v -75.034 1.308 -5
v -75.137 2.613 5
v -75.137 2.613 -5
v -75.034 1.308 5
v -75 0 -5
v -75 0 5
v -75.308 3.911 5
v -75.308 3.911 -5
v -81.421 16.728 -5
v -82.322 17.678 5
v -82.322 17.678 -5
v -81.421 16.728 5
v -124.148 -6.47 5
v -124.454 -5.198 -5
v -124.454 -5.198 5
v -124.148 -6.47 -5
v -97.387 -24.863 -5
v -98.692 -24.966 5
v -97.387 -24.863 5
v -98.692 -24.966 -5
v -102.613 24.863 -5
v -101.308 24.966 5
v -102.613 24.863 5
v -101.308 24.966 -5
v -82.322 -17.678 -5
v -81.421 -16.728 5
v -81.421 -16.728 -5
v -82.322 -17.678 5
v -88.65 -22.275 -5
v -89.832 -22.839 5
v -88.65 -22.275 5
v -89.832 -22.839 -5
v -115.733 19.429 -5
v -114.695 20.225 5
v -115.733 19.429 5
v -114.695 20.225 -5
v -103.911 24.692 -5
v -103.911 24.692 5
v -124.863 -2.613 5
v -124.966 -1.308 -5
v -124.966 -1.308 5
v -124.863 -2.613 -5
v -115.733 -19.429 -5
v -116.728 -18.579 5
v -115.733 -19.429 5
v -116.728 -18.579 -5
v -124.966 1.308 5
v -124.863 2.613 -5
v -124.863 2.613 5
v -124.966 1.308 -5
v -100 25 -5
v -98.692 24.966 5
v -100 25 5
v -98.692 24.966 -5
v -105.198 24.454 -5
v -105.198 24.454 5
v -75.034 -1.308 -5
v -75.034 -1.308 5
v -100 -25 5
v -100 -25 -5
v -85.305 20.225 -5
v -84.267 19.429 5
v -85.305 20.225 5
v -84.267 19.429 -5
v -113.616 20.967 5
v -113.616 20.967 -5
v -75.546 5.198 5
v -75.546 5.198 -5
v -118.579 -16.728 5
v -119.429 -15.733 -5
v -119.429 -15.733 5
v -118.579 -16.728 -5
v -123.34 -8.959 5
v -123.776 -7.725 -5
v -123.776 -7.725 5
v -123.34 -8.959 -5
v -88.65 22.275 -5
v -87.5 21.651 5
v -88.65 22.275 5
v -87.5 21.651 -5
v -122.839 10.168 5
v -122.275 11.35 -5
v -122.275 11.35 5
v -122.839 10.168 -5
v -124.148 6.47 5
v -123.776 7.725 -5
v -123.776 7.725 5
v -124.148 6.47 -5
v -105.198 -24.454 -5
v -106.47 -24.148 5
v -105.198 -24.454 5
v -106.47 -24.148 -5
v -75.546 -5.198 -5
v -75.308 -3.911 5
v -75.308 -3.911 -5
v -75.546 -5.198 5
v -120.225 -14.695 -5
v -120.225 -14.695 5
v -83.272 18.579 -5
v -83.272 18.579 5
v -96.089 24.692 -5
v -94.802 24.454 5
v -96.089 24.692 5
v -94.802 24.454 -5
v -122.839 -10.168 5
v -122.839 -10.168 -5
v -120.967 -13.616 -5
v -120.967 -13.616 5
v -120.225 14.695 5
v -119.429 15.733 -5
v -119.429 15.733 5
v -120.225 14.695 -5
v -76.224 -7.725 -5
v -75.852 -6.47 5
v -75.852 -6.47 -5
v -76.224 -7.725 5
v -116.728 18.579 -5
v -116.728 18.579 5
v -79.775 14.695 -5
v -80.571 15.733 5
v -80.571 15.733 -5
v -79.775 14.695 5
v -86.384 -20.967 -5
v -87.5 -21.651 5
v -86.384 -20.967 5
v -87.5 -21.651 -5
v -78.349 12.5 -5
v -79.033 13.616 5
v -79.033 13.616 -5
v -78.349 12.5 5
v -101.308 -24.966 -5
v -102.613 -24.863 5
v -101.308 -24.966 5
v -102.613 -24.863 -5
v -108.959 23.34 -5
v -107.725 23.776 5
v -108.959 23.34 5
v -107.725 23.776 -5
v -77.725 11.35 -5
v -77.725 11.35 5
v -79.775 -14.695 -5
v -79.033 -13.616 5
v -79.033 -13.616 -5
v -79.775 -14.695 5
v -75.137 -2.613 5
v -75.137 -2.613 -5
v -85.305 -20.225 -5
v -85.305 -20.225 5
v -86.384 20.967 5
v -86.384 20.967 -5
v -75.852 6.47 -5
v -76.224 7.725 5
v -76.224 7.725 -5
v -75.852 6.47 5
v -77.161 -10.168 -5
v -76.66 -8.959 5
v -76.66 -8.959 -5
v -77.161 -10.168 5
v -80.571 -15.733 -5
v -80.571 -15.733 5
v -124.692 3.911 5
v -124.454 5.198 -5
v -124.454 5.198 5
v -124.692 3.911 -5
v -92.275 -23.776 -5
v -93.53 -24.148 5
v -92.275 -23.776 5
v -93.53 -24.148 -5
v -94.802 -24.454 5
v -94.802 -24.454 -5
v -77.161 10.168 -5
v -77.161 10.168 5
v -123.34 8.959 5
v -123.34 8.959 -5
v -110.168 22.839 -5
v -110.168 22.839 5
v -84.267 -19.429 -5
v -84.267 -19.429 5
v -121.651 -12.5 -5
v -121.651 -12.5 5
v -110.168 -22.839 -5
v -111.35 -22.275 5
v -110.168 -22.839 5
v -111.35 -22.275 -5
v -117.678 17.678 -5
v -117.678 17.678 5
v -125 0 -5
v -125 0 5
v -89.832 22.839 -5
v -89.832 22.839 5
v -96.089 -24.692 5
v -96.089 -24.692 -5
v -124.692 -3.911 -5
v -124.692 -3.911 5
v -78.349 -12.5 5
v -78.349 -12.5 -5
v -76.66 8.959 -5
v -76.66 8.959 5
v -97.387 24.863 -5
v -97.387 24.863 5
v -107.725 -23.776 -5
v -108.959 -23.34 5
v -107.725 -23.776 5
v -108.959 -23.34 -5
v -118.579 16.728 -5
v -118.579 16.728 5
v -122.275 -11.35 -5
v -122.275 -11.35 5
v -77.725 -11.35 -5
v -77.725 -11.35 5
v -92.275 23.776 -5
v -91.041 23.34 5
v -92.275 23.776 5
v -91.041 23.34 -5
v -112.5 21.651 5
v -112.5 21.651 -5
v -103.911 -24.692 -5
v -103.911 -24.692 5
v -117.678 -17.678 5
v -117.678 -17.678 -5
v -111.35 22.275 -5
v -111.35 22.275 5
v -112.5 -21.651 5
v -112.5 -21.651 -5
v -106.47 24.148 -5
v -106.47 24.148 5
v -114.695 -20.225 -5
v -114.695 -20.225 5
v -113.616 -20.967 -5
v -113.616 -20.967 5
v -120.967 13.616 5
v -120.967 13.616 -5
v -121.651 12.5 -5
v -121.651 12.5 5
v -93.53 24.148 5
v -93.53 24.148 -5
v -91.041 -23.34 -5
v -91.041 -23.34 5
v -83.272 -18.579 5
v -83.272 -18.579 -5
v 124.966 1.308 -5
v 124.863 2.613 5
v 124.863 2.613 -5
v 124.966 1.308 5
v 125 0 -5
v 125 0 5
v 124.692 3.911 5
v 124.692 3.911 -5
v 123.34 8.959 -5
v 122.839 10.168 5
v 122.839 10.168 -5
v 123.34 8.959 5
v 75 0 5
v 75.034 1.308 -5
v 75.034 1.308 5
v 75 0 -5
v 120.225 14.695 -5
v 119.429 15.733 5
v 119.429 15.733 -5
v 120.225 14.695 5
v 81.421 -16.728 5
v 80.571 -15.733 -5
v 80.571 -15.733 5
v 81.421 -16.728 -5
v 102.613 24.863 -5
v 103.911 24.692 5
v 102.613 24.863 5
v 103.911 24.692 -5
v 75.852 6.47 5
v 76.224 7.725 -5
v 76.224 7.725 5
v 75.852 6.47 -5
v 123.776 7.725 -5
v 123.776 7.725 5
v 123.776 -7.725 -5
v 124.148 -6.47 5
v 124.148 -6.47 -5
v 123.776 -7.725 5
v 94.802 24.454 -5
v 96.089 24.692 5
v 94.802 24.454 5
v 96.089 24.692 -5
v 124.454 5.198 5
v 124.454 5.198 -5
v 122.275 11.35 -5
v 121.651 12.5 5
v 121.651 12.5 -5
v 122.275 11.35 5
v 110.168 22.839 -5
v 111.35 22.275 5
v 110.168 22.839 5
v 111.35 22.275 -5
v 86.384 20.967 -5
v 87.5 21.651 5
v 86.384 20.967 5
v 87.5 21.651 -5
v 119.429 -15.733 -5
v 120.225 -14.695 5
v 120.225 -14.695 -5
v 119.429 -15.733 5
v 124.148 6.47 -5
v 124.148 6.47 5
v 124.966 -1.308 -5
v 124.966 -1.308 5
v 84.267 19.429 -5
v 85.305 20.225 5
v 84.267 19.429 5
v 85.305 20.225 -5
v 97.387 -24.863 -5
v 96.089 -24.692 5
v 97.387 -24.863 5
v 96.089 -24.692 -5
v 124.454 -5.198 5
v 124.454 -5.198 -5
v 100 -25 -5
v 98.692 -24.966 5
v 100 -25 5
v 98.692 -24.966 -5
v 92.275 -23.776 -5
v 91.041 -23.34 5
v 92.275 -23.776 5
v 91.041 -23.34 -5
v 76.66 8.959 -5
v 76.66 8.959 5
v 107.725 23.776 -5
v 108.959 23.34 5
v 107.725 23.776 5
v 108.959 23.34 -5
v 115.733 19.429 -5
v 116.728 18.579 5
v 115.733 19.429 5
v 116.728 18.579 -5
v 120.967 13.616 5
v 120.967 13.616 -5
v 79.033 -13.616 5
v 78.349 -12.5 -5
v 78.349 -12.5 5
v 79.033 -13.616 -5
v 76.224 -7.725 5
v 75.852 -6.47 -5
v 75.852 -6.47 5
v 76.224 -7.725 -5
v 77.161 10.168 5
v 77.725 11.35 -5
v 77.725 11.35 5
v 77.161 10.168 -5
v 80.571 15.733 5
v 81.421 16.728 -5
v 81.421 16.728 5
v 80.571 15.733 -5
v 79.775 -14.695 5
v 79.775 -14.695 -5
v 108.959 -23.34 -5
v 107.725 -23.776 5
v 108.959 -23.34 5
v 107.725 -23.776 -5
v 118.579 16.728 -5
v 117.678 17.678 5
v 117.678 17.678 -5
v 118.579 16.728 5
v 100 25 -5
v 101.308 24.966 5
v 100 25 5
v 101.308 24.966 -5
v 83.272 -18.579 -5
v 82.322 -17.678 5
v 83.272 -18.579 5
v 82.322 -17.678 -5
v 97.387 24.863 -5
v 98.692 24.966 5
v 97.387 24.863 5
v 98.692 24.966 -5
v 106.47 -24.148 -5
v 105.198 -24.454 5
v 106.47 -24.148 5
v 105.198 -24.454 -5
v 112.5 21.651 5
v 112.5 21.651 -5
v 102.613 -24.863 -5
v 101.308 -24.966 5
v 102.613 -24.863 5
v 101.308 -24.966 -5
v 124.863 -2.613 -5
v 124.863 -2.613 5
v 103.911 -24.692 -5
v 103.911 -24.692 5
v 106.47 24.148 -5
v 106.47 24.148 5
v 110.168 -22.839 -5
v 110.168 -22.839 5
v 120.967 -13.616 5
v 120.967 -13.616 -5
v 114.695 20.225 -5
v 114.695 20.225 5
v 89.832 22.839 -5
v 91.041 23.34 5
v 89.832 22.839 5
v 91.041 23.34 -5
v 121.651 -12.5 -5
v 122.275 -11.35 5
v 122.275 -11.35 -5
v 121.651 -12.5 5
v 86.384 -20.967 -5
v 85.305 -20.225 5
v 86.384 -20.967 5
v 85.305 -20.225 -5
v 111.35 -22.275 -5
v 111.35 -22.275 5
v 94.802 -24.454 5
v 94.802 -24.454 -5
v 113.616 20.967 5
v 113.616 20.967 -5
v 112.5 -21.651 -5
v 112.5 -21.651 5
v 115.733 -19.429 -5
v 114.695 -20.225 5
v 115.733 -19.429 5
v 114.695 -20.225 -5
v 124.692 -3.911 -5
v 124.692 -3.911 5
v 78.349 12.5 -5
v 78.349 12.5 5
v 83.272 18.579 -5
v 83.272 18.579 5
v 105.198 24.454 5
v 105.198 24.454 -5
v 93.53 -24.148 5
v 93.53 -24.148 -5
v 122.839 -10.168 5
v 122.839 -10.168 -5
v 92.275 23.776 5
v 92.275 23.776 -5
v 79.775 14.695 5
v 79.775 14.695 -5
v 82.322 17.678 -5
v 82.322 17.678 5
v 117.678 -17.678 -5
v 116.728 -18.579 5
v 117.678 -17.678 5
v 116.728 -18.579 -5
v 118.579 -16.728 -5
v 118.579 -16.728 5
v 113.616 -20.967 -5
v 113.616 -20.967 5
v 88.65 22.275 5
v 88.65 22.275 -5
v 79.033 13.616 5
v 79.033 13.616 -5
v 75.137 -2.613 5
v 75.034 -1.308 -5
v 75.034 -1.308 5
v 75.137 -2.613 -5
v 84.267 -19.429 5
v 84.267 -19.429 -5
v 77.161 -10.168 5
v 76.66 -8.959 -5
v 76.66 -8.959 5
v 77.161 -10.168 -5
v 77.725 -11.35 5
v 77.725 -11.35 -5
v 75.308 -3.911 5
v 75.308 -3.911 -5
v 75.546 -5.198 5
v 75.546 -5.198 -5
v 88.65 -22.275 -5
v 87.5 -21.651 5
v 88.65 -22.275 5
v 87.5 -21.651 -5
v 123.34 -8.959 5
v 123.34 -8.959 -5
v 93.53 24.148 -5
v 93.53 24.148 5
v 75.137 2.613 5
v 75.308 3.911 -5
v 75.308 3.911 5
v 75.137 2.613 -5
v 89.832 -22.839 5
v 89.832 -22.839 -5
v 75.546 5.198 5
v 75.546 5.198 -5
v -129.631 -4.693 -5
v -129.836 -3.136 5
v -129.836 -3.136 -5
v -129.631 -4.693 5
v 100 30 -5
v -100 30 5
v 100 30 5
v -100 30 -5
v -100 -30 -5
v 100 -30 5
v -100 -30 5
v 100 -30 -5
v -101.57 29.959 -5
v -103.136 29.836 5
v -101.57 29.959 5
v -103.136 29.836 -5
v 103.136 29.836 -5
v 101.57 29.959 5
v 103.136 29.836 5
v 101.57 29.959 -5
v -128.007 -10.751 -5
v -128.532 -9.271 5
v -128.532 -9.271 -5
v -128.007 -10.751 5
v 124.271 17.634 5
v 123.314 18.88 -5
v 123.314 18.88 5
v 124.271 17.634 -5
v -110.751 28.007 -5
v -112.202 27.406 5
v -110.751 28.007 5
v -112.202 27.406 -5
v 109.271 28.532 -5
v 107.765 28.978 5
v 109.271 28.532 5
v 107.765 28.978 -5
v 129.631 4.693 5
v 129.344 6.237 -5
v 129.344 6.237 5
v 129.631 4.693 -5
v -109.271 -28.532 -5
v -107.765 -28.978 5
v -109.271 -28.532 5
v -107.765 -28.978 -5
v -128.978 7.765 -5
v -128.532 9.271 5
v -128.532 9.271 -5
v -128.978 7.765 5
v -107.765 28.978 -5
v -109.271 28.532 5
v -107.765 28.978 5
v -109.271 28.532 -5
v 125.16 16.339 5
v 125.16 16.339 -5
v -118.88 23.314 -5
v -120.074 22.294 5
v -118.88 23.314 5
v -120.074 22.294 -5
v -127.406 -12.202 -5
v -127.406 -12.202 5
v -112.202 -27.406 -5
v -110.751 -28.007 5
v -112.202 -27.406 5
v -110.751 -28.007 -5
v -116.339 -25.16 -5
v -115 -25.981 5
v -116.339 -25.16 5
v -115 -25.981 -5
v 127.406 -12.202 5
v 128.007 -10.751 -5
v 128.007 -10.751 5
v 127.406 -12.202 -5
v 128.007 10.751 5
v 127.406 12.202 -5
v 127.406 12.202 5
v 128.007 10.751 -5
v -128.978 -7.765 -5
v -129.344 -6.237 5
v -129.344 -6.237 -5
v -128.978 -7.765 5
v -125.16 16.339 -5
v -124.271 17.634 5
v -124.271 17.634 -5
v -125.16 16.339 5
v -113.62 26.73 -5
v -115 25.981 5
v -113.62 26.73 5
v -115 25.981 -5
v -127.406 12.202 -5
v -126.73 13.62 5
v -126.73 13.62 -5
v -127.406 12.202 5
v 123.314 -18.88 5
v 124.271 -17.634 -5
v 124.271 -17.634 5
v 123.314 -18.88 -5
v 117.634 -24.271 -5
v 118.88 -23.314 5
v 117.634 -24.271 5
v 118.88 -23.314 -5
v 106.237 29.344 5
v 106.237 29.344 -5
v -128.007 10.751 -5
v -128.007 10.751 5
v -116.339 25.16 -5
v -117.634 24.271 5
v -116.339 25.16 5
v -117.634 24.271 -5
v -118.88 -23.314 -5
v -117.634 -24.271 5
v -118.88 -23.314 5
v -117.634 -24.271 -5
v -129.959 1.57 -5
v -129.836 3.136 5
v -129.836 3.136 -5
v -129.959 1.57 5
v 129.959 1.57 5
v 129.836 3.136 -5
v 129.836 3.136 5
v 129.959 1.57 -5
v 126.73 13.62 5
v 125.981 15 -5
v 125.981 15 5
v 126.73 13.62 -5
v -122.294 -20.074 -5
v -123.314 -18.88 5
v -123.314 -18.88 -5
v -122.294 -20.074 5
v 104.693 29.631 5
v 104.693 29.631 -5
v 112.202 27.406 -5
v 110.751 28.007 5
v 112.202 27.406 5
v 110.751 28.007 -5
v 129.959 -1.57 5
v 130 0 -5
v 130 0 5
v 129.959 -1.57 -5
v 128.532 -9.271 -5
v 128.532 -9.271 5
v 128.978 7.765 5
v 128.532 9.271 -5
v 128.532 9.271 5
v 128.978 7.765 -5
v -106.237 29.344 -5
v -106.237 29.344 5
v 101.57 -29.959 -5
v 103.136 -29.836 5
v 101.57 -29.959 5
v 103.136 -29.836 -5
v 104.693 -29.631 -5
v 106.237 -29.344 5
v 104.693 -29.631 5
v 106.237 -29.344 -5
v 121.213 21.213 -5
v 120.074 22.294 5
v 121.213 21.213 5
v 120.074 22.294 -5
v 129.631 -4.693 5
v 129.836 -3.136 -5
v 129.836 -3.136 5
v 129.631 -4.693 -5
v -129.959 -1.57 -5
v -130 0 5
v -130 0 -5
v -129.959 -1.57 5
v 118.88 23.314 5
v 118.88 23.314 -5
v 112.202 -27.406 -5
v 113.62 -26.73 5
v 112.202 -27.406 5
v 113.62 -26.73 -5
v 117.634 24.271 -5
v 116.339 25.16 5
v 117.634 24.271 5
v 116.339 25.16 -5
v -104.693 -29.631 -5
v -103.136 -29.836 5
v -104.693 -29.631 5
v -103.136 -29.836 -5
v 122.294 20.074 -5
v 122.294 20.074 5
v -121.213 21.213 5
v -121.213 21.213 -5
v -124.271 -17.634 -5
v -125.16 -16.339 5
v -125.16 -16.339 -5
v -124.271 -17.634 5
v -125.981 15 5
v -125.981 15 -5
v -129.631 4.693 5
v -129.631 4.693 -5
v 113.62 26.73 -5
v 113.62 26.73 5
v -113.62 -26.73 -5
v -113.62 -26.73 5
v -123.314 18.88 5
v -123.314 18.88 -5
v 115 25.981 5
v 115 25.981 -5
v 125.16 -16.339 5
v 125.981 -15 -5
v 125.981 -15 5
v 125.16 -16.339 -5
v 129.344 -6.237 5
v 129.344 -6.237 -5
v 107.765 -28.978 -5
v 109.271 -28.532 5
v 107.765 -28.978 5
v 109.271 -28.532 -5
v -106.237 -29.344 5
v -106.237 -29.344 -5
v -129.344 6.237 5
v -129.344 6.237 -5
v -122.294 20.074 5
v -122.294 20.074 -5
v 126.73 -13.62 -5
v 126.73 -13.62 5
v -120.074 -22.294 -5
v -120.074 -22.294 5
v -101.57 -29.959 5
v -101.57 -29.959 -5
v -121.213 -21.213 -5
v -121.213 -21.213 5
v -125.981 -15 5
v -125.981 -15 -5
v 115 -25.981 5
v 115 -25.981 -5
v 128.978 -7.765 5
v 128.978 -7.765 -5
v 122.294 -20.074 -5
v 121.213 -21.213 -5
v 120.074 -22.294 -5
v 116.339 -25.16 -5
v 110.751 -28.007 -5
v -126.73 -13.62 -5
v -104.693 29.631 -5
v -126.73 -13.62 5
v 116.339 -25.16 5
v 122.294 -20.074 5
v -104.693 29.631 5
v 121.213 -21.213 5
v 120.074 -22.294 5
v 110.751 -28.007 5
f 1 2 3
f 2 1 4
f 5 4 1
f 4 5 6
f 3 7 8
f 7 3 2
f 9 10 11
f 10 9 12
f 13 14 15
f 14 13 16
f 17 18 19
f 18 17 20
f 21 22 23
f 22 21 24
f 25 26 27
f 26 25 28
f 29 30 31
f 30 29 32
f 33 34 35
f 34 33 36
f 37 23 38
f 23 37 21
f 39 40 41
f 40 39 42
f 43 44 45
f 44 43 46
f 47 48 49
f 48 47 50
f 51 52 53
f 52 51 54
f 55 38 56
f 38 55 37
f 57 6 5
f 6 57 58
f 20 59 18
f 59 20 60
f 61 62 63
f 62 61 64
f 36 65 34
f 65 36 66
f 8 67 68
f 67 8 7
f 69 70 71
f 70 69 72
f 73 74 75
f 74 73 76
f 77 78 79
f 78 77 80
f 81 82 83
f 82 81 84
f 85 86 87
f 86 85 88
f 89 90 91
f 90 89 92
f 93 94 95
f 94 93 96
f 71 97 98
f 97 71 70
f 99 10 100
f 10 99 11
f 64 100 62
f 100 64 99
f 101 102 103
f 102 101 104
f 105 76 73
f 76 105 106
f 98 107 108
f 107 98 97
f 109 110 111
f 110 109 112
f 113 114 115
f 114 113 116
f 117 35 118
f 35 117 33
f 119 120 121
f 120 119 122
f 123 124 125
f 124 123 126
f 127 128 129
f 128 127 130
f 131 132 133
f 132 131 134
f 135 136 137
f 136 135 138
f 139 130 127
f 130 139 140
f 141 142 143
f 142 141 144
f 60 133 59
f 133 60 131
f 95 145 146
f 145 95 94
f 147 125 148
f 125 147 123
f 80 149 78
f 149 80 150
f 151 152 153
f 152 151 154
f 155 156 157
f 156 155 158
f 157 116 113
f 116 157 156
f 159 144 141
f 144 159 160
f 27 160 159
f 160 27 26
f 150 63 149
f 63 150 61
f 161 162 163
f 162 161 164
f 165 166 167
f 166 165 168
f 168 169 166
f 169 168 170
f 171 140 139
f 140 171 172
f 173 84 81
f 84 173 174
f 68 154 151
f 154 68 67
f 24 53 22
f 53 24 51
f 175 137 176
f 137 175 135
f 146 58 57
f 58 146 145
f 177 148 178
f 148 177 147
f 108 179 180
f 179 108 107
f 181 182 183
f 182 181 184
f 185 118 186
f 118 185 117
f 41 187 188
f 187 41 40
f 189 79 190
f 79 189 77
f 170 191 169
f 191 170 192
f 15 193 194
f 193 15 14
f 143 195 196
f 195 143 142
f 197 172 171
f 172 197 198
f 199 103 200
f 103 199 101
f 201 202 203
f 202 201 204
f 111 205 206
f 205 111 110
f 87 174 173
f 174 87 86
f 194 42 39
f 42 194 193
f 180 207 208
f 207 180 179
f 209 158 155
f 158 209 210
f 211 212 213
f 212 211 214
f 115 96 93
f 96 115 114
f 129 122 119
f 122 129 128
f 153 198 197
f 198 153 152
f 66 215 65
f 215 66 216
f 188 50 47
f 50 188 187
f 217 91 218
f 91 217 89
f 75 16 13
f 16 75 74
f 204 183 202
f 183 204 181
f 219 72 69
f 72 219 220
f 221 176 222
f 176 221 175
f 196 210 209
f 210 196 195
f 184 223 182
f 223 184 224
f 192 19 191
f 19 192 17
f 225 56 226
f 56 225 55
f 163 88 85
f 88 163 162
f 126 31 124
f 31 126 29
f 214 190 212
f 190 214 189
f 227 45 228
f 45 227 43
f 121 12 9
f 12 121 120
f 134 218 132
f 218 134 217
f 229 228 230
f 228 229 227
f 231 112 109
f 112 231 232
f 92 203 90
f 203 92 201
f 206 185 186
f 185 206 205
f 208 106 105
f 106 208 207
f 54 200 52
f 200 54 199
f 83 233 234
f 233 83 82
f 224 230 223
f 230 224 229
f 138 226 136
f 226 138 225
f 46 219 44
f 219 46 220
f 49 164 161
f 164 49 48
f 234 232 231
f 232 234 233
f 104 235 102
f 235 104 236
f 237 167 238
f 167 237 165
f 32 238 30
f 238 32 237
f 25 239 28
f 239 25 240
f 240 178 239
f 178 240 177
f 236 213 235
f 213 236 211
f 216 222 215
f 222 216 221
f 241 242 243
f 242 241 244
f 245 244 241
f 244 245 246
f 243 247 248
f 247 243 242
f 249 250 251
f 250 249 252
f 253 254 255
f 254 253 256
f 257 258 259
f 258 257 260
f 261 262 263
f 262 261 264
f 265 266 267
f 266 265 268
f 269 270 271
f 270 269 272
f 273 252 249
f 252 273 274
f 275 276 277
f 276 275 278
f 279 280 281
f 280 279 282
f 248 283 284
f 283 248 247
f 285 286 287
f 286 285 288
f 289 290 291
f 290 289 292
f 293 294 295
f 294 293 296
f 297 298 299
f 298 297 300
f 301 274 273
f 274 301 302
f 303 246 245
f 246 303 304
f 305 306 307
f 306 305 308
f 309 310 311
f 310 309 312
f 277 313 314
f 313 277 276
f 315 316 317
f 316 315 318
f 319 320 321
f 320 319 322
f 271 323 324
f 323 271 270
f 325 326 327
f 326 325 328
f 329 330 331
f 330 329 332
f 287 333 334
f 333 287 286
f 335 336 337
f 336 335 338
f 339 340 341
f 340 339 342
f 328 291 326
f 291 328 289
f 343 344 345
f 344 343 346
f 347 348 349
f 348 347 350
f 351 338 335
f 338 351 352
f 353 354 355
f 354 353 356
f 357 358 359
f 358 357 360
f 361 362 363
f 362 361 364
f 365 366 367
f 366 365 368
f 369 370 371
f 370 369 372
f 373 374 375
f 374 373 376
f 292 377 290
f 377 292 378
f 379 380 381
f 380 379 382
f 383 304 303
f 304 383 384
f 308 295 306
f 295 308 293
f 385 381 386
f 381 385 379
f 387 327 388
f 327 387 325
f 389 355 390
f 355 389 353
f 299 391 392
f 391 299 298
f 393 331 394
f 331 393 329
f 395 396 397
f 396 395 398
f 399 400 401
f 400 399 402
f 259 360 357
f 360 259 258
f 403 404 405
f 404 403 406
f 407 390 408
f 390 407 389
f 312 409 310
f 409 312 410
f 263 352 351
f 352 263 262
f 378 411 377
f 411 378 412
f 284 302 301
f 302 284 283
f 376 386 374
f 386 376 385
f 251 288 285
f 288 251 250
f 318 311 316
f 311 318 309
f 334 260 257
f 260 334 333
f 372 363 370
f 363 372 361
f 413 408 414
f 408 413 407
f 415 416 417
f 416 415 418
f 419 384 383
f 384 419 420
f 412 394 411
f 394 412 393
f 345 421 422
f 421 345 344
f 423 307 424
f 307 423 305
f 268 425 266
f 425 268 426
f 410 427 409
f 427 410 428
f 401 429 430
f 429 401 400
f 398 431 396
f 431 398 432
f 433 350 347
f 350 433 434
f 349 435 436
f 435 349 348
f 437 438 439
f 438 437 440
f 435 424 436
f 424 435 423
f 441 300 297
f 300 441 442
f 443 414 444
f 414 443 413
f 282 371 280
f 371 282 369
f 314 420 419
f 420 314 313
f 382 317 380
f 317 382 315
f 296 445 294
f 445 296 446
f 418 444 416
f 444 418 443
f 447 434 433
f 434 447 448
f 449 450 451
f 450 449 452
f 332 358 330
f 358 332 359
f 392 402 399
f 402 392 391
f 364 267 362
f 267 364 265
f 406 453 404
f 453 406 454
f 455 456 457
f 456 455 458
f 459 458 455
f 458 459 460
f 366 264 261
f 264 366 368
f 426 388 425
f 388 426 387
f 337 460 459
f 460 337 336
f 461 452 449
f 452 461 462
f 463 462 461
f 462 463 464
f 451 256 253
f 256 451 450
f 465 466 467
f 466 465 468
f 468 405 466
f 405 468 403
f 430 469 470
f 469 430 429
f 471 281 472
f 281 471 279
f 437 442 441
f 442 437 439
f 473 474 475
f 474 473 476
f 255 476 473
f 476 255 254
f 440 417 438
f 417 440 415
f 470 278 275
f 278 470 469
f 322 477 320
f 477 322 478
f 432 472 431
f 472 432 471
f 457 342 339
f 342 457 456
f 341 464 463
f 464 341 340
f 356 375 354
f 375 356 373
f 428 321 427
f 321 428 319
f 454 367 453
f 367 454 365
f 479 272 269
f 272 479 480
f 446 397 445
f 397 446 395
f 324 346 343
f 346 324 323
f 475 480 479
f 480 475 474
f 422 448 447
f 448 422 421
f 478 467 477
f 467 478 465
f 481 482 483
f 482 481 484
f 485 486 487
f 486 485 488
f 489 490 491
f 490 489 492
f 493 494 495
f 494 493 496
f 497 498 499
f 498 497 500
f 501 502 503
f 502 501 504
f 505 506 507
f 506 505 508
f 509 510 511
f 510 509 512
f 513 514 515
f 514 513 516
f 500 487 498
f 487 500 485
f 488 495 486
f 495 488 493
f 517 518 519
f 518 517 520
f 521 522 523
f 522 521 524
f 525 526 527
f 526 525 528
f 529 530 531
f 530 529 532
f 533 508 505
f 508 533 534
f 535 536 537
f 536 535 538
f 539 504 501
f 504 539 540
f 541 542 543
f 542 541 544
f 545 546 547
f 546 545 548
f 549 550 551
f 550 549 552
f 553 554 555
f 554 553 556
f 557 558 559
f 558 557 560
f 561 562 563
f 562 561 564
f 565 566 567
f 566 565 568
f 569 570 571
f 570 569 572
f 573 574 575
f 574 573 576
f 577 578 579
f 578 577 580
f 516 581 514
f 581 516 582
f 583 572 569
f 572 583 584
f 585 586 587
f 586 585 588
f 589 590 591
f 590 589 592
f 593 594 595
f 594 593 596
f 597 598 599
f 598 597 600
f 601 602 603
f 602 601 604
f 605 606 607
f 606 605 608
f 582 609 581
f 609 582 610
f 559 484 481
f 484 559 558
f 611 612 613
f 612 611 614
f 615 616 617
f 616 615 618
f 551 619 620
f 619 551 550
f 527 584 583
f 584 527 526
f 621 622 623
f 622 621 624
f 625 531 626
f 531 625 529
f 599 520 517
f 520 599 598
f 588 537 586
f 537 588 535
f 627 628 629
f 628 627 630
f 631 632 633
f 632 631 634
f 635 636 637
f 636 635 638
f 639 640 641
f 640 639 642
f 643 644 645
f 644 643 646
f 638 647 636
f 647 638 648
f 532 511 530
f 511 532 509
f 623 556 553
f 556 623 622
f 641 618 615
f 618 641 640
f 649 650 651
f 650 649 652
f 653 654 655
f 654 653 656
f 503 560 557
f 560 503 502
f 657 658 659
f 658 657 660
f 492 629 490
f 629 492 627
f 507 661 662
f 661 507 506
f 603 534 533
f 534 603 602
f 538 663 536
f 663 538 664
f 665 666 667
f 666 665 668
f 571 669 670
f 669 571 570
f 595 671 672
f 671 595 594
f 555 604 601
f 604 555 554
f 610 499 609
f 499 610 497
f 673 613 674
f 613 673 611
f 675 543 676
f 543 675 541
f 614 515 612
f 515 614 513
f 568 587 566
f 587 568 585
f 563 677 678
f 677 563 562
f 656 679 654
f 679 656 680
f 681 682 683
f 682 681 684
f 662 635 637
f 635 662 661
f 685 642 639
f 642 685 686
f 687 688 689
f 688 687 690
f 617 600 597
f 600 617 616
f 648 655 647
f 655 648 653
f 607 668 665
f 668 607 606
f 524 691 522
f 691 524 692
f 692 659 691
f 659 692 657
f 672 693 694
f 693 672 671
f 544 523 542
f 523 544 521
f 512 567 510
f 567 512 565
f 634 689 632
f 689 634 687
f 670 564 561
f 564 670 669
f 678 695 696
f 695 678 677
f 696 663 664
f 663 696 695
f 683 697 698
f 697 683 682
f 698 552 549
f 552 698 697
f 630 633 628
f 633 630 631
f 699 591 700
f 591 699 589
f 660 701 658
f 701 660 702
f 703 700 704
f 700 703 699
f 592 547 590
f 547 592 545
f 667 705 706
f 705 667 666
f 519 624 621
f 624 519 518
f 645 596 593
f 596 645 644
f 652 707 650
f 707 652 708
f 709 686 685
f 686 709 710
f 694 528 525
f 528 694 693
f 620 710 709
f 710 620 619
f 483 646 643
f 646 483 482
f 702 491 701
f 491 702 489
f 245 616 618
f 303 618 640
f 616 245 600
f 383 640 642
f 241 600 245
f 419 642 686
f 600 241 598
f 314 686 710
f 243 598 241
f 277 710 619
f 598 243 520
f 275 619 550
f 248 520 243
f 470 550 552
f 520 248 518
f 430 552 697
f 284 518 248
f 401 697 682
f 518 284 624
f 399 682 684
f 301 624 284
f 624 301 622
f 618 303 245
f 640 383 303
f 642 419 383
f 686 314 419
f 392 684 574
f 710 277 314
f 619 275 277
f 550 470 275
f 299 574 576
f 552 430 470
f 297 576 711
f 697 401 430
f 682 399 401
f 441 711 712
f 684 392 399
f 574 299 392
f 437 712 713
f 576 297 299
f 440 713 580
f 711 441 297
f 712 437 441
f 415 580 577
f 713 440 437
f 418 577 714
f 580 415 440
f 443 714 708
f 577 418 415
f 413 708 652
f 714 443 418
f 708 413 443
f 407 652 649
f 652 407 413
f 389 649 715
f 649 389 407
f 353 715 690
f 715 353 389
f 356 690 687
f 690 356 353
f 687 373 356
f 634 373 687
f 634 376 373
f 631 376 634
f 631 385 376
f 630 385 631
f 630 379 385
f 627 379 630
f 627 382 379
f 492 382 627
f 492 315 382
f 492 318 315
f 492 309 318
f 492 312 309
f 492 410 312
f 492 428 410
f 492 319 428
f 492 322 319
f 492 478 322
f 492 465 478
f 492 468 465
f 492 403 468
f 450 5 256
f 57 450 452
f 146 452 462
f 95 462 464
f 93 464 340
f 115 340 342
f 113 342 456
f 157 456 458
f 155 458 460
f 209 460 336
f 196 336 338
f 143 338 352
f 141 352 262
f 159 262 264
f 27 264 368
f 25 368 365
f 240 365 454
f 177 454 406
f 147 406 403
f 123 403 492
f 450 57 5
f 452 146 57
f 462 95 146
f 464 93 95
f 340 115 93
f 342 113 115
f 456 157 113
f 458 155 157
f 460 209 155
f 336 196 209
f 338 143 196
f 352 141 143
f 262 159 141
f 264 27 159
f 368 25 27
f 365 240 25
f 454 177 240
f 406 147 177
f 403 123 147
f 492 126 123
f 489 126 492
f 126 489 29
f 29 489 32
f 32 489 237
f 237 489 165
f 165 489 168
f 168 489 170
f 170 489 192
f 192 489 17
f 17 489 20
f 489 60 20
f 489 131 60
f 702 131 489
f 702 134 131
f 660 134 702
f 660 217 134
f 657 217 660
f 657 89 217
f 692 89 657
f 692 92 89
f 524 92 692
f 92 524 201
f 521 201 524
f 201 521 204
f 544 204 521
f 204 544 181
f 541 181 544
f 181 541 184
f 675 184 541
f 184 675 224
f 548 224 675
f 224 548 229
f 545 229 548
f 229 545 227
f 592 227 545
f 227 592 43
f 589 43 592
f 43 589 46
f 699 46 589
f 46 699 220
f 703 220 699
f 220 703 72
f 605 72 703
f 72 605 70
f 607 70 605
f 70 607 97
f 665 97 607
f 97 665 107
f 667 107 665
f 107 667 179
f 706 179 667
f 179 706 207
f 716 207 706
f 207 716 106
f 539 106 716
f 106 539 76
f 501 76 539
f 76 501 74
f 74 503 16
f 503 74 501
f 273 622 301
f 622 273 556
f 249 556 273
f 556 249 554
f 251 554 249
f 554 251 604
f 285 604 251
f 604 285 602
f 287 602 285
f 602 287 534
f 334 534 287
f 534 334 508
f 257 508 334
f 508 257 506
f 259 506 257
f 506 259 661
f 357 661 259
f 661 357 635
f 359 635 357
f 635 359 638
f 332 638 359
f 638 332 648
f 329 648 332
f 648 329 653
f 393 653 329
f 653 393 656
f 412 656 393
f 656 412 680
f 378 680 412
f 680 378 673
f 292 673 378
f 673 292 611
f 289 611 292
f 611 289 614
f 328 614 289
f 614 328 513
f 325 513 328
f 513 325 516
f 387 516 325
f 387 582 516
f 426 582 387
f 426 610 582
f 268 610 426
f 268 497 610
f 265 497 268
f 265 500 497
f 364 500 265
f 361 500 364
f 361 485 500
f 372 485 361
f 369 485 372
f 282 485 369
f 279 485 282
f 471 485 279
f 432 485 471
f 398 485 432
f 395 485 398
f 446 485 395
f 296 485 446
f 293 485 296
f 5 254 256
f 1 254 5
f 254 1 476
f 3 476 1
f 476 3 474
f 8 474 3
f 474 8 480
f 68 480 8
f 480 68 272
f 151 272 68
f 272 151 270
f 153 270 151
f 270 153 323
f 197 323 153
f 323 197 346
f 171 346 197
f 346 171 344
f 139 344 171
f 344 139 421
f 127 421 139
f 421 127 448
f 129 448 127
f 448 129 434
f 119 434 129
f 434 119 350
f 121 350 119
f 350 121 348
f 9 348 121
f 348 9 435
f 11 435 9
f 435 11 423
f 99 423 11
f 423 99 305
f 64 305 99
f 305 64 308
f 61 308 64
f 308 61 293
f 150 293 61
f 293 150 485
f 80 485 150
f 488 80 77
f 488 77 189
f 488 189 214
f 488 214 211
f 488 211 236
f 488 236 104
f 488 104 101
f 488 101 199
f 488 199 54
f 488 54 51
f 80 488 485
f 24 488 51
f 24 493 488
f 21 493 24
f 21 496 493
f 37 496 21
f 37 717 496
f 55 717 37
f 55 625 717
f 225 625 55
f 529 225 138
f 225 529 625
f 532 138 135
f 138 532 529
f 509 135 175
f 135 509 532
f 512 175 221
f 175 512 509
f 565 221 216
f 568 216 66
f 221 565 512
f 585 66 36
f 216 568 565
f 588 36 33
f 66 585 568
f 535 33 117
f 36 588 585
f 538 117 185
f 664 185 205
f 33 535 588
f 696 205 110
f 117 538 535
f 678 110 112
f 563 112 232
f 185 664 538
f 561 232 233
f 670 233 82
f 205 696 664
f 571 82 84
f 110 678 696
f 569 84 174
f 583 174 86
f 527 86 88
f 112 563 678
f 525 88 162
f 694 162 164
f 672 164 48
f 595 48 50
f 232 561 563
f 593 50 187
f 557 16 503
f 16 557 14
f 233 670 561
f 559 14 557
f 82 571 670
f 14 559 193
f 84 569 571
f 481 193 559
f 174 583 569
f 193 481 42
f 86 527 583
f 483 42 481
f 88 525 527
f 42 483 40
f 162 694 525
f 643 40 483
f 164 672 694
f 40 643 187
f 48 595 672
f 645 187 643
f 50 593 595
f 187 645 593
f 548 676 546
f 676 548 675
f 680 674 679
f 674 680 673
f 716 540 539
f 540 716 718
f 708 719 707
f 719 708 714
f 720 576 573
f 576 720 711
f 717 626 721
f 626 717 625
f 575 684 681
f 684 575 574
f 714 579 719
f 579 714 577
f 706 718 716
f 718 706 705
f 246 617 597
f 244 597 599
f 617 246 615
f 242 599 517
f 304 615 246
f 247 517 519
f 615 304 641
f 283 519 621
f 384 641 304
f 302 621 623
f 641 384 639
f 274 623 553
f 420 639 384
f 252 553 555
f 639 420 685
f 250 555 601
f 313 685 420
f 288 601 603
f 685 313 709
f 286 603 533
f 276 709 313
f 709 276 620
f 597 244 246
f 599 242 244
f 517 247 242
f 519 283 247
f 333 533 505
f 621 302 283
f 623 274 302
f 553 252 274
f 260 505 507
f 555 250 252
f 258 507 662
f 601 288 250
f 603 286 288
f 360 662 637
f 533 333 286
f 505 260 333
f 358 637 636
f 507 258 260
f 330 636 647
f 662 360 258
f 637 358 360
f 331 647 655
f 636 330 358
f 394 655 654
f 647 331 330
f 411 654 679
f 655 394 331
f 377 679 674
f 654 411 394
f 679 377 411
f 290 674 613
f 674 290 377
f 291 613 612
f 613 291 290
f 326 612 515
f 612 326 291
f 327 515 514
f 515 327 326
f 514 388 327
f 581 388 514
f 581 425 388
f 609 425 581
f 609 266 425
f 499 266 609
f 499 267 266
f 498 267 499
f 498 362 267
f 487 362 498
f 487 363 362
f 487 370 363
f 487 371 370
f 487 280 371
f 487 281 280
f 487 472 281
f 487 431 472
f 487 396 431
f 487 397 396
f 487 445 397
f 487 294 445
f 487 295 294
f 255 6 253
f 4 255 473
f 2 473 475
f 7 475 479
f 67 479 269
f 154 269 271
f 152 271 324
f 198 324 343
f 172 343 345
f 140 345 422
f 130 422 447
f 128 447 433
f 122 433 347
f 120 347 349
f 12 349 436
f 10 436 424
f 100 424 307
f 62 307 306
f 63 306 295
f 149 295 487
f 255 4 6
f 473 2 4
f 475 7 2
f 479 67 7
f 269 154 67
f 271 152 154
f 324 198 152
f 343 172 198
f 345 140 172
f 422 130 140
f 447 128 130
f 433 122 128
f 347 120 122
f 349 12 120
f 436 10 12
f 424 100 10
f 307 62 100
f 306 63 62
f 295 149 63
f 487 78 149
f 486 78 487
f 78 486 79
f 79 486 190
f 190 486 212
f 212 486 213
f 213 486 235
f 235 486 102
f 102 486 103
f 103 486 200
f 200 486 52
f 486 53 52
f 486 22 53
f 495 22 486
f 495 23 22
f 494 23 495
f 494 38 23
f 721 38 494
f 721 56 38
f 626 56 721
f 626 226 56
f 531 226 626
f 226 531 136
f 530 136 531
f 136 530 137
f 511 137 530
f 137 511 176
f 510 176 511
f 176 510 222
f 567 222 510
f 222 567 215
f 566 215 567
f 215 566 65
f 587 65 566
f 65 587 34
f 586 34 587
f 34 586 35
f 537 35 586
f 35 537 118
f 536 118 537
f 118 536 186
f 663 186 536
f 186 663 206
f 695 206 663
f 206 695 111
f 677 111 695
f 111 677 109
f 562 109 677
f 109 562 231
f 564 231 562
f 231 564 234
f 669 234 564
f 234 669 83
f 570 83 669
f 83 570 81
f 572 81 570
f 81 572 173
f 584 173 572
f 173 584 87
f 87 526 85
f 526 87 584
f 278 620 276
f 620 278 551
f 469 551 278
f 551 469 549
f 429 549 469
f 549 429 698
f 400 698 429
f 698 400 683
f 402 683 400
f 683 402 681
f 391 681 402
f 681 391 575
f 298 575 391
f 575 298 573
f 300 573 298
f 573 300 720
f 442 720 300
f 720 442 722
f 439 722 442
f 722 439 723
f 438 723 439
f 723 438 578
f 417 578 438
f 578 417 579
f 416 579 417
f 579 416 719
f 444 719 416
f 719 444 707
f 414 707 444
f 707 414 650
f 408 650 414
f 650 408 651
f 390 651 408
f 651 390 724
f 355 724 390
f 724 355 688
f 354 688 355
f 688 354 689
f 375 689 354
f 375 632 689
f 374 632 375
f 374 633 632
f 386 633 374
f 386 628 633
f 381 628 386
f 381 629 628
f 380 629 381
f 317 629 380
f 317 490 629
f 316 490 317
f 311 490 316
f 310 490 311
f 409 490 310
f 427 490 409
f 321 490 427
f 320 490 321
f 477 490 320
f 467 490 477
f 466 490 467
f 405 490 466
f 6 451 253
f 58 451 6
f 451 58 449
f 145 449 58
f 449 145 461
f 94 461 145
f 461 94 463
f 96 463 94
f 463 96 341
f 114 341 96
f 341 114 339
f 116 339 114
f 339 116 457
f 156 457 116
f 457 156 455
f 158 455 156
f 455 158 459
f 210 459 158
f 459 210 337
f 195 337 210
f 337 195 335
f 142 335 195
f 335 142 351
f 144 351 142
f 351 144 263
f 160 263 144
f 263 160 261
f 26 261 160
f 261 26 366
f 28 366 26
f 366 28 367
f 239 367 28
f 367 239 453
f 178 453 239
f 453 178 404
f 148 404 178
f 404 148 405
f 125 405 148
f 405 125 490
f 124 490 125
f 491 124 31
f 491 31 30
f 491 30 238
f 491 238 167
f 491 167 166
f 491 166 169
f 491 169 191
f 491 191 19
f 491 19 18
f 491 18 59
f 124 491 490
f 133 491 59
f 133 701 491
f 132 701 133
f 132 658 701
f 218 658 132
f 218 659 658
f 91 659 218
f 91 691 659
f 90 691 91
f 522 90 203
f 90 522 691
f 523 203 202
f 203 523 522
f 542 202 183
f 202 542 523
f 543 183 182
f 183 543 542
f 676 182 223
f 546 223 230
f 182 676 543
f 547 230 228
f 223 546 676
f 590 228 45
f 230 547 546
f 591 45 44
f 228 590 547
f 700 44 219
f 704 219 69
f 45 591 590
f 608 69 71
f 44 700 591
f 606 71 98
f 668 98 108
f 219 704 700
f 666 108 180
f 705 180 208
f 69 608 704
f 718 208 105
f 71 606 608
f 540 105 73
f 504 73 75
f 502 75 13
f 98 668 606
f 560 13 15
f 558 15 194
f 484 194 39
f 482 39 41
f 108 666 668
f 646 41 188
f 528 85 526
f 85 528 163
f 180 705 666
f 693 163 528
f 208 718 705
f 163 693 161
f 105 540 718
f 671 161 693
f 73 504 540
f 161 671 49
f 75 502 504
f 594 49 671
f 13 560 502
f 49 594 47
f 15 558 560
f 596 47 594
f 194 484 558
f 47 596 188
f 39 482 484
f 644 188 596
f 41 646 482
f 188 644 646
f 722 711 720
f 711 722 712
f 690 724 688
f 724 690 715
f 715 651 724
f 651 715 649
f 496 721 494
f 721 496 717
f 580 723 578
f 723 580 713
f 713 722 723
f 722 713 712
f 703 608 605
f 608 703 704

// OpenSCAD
// file: NewBearing/bearing_test.scad
bextra=0.2;
ball_dia=5.91;
$fn=120;
main_diameter=75;
race_spacing=0.5;
race_width=10;
race_height=10;
holes=24;
hole_diameter=3;

//cutout_race();
//difference(){
//  union(){
//    inside_race();
//    outside_race();
//  }
//  cube(100);
//}

module inside_race(diameter=main_diameter, holes=holes, ball_dia=ball_dia,
                    offset=-0.5, race_spacing=race_spacing, 
                    race_width=race_width, race_height=race_height){
  translate([0,0,-offset])
  difference(){
  rotate_extrude()
    translate([diameter-race_width+race_spacing,0,0]) 
      difference(){
        square([race_width-race_spacing,race_height]);
        translate([race_width-race_spacing,race_height/2+offset,0]) 
          circle(d=ball_dia+bextra);
      }
    translate([0,diameter,race_height/2+offset]){
      cylinder(d=ball_dia+bextra, h=race_height/2+abs(offset));
      cylinder(d=ball_dia/2, h=race_height+2, center=true);
    }
    if(holes > 0)
      for(R=[0:360/holes:360]) rotate([0,0,R])
        translate([0,diameter-ball_dia/2-(race_width-ball_dia/2)/2,-0.5]) 
          cylinder(d=hole_diameter, h=race_height+1);
  }
}

module outside_race(diameter=main_diameter, holes=holes, ball_dia=ball_dia,
                    offset=+0.5, race_spacing=race_spacing, 
                    race_width=race_width, race_height=race_height){
  translate([0,0,-offset])
  difference(){
    rotate_extrude()
      translate([diameter+race_spacing,0,0]) 
        difference(){
          square([race_width-race_spacing,race_height]);
          translate([-race_spacing,race_height/2+offset,0]) 
            circle(d=ball_dia+bextra);
        }
      translate([0,diameter,race_height/2+abs(offset)]){
        cylinder(d=ball_dia+bextra, h=race_height/2+offset);
        cylinder(d=ball_dia/2, h=race_height*2, center=true);
      }
      if(holes > 0)
        for(R=[0:360/holes:360]) rotate([0,0,R])
          translate([0,diameter+ball_dia/2+(race_width-ball_dia/2)/2,-0.5]) 
            cylinder(d=hole_diameter, h=race_height+1);
  }
}

module cutout_race(diameter=main_diameter, ball_dia=ball_dia,
                    race_spacing=race_spacing, race_height=race_height){
    rotate_extrude()
      translate([diameter,0,0]) {
          translate([0,race_height/2,0]) 
            circle(d=ball_dia+bextra);
          translate([-race_spacing/2,0,0]) 
          square([race_spacing,race_height+1]);
        }
      translate([0,diameter,race_height/2]){
        cylinder(d=ball_dia+bextra, h=race_height);
        cylinder(d=ball_dia/2, h=race_height*2, center=true);
      }
}
// main file
include <NewBearing/bearing_test.scad>


main_diameter=35;
//inside_race(diameter=main_diameter, holes=holes, ball_dia=ball_dia,
//                    offset=-0.5, race_spacing=race_spacing, 
//                    race_width=race_width, race_height=race_height,
//                    bextra=bextra);
//outside_race(diameter=main_diameter, holes=holes, ball_dia=ball_dia,
//                    offset=+0.5, race_spacing=race_spacing, 
//                    race_width=race_width, race_height=race_height, 
//                    bextra=bextra);
//assembly();
tv_stand_mount();
module assembly(){

%cylinder(d=75.5,h=60);
%rotate([0,90,0]) strong_hero();
%cylinder(d=90,h=10);
}

module strong_hero(){
  difference(){
    union(){
      for(Z=[-1,1]) translate([0,0,28.5*Z]) 
        cylinder(d=200,h=3,center=true);
      cylinder(d=80,h=60,center=true);
    }
    cylinder(d=74.5,h=61,center=true);
  }
}

module tv_stand_mount(width=100){
  %for(X=[-1,1]) translate([100*X,0,0]) 
    cylinder(d=50,h=200,center=true);
  difference(){
    hull() for(X=[-1,1]){
      translate([width*X,0,0]) cylinder(d=60,h=10,center=true);
    }
    for(X=[-1,1]){
      translate([width*X,0,0]) cylinder(d=50,h=11,center=true);
      %translate([65*X,0,0]) rotate([90,0,0]) cylinder(d=5,h=100,center=true);
    }
  }
}
